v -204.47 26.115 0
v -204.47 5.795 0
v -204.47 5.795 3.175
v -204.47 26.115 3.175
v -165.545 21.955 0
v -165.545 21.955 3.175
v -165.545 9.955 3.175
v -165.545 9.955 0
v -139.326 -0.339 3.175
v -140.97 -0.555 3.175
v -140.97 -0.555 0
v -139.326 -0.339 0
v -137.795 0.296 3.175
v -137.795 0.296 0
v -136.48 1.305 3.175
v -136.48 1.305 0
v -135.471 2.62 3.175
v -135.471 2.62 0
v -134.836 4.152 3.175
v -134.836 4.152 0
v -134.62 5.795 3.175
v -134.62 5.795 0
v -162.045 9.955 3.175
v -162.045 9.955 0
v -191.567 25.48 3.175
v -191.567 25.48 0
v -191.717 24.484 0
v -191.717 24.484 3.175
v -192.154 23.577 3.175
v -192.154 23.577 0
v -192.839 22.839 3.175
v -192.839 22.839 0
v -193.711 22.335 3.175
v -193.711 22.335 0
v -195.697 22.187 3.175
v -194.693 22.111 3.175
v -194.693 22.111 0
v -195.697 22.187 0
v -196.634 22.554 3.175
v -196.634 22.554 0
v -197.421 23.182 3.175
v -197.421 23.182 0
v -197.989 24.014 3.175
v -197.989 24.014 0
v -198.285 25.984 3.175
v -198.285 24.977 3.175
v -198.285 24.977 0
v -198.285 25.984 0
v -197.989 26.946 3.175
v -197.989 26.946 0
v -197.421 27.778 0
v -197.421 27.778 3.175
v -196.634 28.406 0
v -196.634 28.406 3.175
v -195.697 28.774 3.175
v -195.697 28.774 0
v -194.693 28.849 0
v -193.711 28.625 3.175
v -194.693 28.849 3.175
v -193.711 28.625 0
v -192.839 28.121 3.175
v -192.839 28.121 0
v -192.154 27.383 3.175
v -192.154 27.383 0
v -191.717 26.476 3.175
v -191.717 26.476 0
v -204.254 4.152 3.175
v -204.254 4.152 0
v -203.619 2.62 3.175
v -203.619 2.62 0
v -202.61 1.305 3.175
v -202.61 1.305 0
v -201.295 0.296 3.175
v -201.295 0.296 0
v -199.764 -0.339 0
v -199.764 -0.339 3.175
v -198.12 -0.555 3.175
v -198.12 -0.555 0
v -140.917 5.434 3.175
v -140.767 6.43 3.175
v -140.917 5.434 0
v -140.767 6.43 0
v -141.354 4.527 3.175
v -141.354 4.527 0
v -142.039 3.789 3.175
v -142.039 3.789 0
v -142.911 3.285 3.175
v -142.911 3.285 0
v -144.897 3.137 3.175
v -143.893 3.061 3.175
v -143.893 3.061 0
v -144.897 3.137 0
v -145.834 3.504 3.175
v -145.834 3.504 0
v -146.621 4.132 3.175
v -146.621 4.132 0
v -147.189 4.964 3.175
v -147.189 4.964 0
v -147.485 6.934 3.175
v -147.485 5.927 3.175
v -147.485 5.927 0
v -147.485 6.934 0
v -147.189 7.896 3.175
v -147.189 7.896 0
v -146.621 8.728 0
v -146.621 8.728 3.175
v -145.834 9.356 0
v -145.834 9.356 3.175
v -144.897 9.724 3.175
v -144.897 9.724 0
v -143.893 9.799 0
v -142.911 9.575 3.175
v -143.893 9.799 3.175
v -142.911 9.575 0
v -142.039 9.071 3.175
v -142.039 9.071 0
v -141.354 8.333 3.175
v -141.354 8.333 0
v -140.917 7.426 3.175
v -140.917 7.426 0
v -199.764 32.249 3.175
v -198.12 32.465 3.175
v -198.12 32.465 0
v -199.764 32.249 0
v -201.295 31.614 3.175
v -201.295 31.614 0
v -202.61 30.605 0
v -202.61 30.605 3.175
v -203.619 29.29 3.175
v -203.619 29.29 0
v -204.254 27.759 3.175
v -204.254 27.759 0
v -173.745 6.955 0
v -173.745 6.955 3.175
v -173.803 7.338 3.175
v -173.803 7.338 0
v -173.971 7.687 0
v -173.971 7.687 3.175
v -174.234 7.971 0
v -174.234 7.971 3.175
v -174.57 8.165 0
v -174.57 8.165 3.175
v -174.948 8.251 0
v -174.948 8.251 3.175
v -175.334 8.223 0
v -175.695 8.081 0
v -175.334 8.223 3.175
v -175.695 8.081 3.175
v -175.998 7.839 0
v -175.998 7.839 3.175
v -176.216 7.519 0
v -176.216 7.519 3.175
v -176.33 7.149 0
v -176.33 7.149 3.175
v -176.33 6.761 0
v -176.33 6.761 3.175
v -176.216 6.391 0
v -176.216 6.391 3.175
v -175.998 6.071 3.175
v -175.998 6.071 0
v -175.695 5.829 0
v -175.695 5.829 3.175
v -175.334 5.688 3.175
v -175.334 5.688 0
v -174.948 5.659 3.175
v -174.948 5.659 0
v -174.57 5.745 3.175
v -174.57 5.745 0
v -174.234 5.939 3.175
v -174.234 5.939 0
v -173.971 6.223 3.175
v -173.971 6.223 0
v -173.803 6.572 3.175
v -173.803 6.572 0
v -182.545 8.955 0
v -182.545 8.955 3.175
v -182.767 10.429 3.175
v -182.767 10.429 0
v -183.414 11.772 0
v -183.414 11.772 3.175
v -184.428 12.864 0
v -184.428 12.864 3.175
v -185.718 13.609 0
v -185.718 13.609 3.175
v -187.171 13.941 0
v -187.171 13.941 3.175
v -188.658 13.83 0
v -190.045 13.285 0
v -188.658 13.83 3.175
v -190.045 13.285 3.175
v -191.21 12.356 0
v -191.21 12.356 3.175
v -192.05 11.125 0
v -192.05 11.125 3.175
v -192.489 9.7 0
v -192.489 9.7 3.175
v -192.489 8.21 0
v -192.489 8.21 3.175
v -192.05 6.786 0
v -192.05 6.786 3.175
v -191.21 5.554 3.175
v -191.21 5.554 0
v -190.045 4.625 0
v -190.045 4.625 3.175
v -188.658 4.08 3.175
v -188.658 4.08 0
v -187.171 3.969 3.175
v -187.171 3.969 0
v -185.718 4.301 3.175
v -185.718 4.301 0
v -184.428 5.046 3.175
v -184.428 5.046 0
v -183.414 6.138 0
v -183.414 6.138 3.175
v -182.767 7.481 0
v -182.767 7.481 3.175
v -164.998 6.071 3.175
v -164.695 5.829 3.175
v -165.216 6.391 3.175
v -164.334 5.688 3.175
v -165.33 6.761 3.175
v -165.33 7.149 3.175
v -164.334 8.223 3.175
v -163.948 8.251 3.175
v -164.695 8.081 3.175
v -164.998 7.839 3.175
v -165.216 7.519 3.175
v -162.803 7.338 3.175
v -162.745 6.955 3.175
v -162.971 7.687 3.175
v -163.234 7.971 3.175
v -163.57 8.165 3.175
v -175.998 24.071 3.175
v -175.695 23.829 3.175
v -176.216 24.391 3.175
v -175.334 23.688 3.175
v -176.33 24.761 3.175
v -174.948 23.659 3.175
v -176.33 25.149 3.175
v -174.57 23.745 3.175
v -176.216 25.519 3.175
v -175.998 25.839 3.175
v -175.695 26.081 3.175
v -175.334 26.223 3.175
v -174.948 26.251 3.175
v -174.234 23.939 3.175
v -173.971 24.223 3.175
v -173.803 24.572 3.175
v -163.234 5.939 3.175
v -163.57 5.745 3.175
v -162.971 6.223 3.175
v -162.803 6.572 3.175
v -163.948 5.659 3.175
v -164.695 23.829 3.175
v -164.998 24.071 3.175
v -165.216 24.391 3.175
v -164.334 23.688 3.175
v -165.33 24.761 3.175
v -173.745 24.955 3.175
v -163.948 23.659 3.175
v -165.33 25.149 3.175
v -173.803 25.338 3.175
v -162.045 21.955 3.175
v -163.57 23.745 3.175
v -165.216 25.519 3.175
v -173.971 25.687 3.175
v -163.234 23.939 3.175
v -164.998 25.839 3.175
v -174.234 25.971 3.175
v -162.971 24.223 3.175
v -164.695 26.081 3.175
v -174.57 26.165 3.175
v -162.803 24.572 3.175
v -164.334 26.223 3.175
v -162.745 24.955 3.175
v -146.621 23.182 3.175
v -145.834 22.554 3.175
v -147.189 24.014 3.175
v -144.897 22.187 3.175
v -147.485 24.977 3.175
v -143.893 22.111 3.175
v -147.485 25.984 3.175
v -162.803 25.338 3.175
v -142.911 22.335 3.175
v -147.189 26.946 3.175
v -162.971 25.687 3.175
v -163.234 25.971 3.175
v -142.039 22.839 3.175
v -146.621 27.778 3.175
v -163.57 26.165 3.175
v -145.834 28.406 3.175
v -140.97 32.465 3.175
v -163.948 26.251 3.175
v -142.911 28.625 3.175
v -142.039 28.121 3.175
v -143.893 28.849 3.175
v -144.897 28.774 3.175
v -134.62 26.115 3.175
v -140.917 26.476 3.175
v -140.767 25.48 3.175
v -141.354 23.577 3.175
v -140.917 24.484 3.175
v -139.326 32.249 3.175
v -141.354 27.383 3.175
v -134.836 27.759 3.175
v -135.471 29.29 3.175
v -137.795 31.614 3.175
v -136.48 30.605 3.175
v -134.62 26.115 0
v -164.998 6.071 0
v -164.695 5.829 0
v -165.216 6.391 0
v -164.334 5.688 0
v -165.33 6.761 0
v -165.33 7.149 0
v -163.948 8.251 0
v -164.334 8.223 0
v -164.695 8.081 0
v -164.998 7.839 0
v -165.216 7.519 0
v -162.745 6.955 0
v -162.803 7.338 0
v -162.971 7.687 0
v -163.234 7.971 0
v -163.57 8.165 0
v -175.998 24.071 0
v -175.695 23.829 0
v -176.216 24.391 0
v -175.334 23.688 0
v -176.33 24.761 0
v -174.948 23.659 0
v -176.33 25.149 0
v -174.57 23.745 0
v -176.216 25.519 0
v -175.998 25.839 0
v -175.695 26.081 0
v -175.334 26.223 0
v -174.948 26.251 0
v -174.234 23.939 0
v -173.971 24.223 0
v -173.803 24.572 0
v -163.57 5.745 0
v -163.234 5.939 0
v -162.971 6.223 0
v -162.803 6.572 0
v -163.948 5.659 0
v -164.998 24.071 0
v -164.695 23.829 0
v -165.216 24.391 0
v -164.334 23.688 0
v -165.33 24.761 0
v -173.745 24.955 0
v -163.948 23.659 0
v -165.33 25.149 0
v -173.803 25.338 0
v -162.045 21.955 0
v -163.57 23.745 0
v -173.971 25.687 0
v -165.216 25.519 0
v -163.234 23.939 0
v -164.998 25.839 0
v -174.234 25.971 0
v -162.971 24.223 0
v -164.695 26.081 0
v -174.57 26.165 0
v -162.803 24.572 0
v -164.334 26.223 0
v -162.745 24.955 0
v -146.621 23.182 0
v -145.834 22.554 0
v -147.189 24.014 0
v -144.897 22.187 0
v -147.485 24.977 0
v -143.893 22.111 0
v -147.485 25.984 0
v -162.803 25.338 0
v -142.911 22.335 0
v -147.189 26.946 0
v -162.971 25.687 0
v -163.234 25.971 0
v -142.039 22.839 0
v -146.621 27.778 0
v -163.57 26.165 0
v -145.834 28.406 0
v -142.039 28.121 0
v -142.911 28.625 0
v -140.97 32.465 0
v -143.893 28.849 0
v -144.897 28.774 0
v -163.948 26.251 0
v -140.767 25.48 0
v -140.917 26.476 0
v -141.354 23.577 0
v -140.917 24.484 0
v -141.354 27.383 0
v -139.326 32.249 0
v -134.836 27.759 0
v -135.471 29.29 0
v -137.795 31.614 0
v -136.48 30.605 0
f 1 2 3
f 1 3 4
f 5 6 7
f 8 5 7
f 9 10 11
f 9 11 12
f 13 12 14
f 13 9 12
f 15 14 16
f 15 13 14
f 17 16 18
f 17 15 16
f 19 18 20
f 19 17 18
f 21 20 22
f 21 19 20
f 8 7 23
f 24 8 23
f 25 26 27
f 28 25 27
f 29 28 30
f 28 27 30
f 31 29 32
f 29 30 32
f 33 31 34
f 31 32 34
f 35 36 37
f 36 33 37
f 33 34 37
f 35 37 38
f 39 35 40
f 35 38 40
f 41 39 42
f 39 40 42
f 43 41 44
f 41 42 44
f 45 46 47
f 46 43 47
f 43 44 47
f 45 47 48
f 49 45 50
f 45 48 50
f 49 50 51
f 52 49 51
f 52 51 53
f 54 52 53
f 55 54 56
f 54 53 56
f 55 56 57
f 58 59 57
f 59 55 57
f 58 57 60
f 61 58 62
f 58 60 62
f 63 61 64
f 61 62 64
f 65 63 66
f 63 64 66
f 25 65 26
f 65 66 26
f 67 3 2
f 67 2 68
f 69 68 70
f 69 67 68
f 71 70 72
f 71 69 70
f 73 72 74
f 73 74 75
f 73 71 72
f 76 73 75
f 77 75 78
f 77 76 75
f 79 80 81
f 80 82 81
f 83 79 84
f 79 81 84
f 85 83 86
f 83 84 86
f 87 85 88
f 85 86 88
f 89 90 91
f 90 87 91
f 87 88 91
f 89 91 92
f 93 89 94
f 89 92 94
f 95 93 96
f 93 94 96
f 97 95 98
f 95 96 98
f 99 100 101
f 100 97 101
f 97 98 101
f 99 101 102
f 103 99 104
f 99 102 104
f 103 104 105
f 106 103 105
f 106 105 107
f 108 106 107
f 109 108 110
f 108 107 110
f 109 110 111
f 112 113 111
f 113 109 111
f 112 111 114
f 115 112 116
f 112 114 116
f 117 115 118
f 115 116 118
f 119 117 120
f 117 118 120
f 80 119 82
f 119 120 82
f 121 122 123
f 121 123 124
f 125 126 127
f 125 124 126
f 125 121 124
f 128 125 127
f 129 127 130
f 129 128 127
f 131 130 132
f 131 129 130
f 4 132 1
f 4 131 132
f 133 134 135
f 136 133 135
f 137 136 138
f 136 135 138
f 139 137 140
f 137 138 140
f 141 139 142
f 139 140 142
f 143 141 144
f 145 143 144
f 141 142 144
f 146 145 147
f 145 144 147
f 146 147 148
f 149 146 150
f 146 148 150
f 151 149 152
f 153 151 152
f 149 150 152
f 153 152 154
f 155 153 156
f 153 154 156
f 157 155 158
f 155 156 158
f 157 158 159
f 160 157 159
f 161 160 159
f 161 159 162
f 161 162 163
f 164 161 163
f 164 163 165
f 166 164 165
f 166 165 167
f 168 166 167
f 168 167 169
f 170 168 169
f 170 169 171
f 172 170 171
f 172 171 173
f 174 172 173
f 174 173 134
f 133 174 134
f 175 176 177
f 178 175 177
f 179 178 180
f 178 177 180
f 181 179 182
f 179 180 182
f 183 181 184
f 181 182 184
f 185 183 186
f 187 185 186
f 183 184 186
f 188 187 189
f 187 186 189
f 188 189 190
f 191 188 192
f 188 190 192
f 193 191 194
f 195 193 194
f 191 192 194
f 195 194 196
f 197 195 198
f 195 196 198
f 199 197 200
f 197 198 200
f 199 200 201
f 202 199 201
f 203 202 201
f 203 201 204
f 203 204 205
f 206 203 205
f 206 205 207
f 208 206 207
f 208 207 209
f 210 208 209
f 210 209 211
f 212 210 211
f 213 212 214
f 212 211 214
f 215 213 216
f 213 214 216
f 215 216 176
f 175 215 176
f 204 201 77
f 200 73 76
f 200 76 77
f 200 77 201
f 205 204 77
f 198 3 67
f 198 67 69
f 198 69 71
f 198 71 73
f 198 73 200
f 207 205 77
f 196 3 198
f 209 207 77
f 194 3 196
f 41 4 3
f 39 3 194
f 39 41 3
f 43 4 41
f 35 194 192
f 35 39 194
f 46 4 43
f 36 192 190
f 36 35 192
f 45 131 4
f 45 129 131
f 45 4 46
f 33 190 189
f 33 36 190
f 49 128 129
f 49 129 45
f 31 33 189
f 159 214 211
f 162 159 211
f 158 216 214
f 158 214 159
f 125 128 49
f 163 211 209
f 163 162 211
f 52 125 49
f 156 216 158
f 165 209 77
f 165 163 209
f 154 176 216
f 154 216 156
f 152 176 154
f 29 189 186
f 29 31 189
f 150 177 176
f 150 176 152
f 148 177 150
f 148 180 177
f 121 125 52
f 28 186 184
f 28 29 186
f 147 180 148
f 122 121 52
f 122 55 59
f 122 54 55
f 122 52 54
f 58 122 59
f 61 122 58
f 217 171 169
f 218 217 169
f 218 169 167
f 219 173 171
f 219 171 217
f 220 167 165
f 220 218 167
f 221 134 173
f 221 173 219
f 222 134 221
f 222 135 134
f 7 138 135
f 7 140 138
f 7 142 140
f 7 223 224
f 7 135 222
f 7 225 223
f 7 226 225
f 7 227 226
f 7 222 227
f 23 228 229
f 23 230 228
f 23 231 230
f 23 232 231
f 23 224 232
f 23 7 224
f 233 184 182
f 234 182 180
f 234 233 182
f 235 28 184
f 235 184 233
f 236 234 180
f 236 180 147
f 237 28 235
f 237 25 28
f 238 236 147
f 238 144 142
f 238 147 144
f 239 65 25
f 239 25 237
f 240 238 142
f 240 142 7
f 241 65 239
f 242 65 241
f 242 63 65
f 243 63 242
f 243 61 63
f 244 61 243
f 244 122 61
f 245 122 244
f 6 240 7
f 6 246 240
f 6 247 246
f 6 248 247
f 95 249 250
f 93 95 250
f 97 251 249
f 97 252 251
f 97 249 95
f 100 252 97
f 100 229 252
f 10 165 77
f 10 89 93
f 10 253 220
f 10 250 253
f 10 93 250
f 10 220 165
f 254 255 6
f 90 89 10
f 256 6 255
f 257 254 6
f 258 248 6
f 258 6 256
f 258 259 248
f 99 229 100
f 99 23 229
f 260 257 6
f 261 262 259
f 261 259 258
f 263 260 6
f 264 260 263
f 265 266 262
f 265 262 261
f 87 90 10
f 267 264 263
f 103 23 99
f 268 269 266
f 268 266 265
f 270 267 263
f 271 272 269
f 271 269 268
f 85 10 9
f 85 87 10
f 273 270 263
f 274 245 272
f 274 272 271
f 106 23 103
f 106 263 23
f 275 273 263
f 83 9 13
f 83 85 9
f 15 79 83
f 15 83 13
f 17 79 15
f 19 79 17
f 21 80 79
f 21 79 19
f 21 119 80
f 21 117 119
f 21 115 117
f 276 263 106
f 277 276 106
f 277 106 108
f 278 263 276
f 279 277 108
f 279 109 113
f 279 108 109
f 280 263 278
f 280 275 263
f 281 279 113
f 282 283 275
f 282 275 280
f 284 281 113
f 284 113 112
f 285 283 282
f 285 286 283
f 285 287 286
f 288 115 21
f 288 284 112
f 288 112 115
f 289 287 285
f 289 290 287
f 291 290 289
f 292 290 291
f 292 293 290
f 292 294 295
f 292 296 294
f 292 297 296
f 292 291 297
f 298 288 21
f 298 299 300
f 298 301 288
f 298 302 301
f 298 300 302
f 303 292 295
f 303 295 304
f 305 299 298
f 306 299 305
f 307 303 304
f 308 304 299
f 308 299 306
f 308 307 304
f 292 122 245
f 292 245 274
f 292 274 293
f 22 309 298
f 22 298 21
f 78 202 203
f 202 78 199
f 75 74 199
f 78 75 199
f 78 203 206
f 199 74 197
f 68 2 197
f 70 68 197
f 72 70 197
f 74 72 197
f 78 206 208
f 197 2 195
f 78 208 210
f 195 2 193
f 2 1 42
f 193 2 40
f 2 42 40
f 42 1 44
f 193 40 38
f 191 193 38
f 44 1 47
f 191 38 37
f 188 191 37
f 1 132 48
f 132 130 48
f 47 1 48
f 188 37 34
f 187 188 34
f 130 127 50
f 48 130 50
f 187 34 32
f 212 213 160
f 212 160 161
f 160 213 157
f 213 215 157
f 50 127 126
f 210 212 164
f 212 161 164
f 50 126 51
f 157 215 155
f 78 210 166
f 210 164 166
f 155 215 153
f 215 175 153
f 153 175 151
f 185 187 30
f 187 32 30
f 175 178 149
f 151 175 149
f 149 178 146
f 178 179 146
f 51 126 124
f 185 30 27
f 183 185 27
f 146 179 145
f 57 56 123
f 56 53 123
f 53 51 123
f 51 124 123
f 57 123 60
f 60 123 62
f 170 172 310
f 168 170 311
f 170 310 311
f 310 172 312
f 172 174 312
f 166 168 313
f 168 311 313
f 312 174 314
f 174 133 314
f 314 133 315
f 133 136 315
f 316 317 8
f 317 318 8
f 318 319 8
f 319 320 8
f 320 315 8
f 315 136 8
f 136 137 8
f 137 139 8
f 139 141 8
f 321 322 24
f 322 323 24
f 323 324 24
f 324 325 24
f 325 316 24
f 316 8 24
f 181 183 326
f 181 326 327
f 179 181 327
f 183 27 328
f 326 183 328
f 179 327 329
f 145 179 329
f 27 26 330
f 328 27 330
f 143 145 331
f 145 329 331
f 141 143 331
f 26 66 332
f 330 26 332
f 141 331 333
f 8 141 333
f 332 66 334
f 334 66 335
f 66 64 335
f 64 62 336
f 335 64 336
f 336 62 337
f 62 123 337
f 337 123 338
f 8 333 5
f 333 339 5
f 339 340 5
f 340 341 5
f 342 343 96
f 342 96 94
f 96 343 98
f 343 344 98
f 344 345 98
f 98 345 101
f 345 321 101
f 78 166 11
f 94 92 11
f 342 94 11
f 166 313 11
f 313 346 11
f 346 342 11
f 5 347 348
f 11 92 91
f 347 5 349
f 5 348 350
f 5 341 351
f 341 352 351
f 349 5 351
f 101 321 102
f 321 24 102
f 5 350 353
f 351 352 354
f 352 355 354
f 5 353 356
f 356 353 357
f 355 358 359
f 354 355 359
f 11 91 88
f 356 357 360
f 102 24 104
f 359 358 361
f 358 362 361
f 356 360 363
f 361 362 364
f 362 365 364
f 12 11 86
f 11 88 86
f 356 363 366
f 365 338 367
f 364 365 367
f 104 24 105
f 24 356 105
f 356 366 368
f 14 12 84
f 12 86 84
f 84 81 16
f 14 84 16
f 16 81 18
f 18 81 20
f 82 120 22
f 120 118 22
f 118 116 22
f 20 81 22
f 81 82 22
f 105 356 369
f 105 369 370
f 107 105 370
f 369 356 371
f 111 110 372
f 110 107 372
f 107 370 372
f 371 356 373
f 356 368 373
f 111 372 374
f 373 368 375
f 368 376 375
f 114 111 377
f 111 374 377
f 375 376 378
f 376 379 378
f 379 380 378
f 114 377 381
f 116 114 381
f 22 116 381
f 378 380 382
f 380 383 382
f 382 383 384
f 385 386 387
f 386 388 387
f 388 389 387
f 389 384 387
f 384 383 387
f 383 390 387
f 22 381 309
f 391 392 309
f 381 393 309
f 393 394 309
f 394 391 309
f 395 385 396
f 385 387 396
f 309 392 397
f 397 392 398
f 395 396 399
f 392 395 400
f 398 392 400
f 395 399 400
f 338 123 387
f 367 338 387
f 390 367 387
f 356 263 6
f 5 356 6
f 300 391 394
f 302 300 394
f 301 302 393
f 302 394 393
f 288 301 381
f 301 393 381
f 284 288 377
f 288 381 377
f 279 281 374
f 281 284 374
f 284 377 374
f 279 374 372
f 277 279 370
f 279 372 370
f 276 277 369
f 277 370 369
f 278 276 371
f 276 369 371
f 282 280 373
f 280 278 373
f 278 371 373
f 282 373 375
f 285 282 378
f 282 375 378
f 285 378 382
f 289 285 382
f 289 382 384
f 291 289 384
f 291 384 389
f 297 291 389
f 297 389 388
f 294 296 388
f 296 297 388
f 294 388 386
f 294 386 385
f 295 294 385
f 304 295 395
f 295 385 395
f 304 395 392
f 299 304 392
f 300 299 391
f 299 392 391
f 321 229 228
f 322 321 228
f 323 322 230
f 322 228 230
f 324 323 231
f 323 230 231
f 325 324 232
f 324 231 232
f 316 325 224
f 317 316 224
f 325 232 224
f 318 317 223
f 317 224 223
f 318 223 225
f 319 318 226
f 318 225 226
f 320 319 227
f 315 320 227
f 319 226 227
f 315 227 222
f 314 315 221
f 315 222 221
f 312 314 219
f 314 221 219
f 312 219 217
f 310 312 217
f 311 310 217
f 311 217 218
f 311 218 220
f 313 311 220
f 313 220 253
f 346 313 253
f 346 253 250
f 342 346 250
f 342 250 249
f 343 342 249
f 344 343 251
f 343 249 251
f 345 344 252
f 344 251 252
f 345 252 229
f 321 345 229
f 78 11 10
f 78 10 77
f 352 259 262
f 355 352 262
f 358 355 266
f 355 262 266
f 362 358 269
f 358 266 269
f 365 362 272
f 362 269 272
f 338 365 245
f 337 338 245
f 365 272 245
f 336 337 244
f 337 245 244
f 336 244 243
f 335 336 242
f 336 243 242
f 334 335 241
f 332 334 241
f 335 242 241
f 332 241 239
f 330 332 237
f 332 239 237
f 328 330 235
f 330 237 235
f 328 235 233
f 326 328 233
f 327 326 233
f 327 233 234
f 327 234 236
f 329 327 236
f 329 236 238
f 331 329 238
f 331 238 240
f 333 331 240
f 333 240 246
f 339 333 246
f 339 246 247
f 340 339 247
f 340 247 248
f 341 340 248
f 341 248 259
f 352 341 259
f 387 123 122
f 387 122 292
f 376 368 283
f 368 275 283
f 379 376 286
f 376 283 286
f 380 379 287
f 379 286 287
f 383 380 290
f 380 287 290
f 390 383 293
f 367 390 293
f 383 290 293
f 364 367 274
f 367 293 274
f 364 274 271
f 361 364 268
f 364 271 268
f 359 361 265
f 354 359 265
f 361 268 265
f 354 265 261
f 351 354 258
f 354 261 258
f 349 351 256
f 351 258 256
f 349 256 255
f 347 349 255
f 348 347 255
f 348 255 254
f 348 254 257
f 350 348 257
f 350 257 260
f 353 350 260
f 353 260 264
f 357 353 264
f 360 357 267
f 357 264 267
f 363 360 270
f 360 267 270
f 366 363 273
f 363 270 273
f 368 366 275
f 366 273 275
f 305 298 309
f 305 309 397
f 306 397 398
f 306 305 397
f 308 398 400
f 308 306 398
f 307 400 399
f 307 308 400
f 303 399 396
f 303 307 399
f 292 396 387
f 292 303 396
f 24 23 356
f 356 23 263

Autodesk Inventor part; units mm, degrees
ref_plane "YZ Plane" through (0, 0, 0) normal (1, 0, 0) x (0, 1, 0)
ref_plane "XZ Plane" through (0, 0, 0) normal (0, 1, 0) x (-1, 0, 0)
ref_plane "XY Plane" through (0, 0, 0) normal (0, 0, 1) x (1, 0, 0)
sketch "Sketch1" plane through (0, 0, 0) normal (0, 0, 1) x (1, 0, 0)
  circle A0 centre (-194.945, 6.4301) radius 3.3782
  circle A1 centre (-194.945, 25.4801) radius 3.3782
  circle A2 centre (-144.145, 6.4301) radius 3.3782
  circle A3 centre (-144.145, 25.4801) radius 3.3782
  circle A4 centre (-169.545, 15.9551) radius 14.2875
  line L0 (-254, -1.8249) -> (254, -1.8249) construction
  line L1 (-247.65, 40.5304) -> (247.65, 40.5304) construction
  line L2 (-204.47, -0.5549) -> (-204.47, 32.4651)
  line L3 (-204.47, 32.4651) -> (-134.62, 32.4651)
  line L4 (-134.62, 32.4651) -> (-134.62, -0.5549)
  line L5 (-134.62, -0.5549) -> (-204.47, -0.5549)
  point P0 (0, 0)
extrude "Extrusion1" add sketch "Sketch1" along normal blind 3.175 contours A0 | A4 | L2 L3 L4 L5
fillet "Fillet1" radius 6.35 4 edges at (-204.47, 32.4651, 1.5875) (-204.47, -0.5549, 1.5875) (-134.62, 32.4651, 1.5875) (-134.62, -0.5549, 1.5875)
sketch "Sketch2" plane through (0, 0, 3.175) normal (0, 0, 1) x (1, 0, 0)
  line L0 (-134.62, 26.1151) -> (-134.62, 5.7951) projected
  line L1 (-198.12, 32.4651) -> (-140.97, 32.4651) projected
  line L2 (-204.47, 5.7951) -> (-204.47, 26.1151) projected
  line L3 (-140.97, -0.5549) -> (-198.12, -0.5549) projected
  line L4 (-169.545, 32.4651) -> (-169.545, -0.5549) construction
  line L5 (-204.47, 15.9551) -> (-134.62, 15.9551) construction
  circle A0 centre (-175.045, 24.9551) radius 1.3
  circle A1 centre (-164.045, 24.9551) radius 1.3
  circle A2 centre (-175.045, 6.9551) radius 1.3
  circle A3 centre (-164.045, 6.9551) radius 1.3
  line L6 (-175.045, 24.9551) -> (-164.045, 24.9551) construction
  line L7 (-175.045, 6.9551) -> (-164.045, 6.9551) construction
  line L8 (-175.045, 24.9551) -> (-175.045, 6.9551) construction
  line L9 (-165.545, 21.9551) -> (-165.545, 9.9551)
  line L10 (-165.545, 9.9551) -> (-162.045, 9.9551)
  line L11 (-162.045, 9.9551) -> (-162.045, 21.9551)
  line L12 (-162.045, 21.9551) -> (-165.545, 21.9551)
  circle A4 centre (-187.545, 8.9551) radius 5
  point P0 (0, 0)
  point P1 (-169.545, 6.9551)
  point P2 (-175.045, 15.9551)
  point P3 (-162.045, 15.9551)
  dimension "d7" = 2.6
  dimension "d10" = 11
  dimension "d13" = 18
  dimension "d16" = 12
  dimension "d17" = 3.5
  dimension "d18" = 4
  dimension "d19" = 10
  dimension "d20" = 7
  dimension "d21" = 18
extrude "Extrusion2" cut sketch "Sketch2" against normal through all
equation "\"d2\" = d1"
equation "\"d1\" = 9.525"
properties part number "V5 Shooter Bearing Encoder Plate" material "Polycarbonate, Clear"
